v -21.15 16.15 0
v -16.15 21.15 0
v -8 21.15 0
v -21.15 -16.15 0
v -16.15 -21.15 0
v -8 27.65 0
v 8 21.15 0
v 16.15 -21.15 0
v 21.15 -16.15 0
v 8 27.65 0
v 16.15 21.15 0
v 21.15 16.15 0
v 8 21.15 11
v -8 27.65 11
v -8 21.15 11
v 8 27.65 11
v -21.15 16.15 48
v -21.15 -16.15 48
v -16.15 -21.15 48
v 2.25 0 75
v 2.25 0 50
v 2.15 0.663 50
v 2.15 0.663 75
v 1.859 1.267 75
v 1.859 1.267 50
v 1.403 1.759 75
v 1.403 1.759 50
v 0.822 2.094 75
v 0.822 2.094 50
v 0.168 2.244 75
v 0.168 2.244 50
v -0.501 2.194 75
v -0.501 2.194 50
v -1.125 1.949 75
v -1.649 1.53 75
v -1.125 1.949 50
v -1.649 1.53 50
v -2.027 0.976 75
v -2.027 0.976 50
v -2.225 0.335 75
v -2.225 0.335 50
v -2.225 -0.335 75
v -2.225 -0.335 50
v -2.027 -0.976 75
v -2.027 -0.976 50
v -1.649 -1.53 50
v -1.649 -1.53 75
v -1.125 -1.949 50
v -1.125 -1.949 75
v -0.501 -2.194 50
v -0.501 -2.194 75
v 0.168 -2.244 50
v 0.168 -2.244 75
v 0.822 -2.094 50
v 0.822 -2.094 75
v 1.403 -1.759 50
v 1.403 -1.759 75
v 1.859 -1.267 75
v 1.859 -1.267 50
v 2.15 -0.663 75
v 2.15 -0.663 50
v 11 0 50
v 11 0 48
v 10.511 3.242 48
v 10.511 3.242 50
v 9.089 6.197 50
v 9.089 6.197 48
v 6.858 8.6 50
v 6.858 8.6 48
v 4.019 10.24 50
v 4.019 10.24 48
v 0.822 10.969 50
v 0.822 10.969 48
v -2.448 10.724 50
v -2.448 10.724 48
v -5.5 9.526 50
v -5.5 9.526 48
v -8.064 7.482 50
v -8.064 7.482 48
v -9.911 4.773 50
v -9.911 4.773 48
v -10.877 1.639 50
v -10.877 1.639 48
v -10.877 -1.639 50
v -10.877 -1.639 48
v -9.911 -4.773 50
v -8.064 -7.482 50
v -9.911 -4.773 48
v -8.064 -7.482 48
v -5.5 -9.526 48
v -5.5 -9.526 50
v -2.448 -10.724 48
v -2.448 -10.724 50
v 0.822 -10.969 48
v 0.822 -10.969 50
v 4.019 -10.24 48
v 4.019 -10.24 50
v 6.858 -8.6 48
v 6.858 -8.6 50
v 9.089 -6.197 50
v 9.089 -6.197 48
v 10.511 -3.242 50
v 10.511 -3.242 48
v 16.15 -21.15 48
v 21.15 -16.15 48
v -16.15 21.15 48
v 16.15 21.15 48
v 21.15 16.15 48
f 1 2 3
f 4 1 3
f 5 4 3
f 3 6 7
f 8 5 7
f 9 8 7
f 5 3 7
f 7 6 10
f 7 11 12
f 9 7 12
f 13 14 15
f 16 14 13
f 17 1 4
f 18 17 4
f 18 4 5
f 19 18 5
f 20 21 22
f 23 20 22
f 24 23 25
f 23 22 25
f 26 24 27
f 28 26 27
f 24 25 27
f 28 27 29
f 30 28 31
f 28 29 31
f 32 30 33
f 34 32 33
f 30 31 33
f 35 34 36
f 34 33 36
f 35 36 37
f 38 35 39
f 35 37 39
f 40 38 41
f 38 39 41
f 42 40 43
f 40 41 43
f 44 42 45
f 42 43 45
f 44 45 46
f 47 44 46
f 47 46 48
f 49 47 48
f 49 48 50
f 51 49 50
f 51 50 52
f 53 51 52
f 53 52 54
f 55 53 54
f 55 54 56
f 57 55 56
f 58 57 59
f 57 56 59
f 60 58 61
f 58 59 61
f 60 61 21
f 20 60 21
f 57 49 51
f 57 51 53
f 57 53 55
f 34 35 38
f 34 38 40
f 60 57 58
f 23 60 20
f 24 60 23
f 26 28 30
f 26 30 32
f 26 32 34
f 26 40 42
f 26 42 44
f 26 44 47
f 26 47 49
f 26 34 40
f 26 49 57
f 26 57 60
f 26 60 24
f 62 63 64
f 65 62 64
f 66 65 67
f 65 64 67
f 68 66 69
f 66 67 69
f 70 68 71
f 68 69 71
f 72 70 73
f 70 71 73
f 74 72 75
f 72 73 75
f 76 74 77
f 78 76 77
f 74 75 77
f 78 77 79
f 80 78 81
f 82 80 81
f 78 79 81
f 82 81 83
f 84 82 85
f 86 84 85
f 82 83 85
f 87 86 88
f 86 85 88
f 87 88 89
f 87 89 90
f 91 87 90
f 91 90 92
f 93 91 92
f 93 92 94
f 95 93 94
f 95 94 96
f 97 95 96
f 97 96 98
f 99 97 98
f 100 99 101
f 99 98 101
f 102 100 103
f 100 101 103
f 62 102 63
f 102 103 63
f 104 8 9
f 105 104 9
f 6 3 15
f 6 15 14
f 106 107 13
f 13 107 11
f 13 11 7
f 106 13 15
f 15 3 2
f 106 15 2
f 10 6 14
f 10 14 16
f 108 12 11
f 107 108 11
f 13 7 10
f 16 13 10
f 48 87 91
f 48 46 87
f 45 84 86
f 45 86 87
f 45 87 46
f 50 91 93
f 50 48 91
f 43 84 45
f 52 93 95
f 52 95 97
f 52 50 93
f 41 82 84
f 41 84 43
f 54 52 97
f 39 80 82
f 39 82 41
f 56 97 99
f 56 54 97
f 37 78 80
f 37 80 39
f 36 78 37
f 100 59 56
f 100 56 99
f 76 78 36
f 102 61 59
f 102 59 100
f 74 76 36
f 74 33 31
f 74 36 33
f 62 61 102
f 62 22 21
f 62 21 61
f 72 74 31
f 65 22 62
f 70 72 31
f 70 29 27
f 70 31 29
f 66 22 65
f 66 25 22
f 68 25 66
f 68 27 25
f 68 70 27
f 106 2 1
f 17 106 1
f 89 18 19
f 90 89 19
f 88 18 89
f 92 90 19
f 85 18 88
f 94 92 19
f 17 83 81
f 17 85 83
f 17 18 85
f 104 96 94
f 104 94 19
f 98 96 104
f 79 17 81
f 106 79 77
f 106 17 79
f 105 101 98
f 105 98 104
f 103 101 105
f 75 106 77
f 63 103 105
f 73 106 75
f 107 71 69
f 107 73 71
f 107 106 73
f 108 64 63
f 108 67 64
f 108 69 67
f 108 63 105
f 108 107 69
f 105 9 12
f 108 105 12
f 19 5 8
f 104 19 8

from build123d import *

# Parameters (mm, degrees)
F1_DEPTH = 48
F2_W     = 16
F2_H     = 6.5
F3_DEPTH = 11
F4_R     = 11
F5_DEPTH = 2
F6_R     = 2.25
F7_DEPTH = 25


with BuildPart() as f1:
    # F0 (on Top) → F1 (new body)
    with BuildSketch(Plane.XY):
        Polygon((16.15, 21.15), (-16.15, 21.15), (-21.15, 16.15), (-21.15, -16.15), (-16.15, -21.15), (16.15, -21.15), (21.15, -16.15), (21.15, 16.15), align=None)
    extrude(amount=F1_DEPTH)

    # F2 (on Top) → F3 (join)
    with BuildSketch(Plane.XY):
        with Locations((0, 24.4)):
            Rectangle(F2_W, F2_H)
    extrude(amount=F3_DEPTH)

    # F4 (on face) → F5 (join)
    with BuildSketch(Plane.XY.offset(48)):
        Circle(F4_R)
    extrude(amount=F5_DEPTH)

    # F6 (on face) → F7 (join)
    with BuildSketch(Plane.XY.offset(50)):
        Circle(F6_R)
    extrude(amount=F7_DEPTH)


solid = f1.part
